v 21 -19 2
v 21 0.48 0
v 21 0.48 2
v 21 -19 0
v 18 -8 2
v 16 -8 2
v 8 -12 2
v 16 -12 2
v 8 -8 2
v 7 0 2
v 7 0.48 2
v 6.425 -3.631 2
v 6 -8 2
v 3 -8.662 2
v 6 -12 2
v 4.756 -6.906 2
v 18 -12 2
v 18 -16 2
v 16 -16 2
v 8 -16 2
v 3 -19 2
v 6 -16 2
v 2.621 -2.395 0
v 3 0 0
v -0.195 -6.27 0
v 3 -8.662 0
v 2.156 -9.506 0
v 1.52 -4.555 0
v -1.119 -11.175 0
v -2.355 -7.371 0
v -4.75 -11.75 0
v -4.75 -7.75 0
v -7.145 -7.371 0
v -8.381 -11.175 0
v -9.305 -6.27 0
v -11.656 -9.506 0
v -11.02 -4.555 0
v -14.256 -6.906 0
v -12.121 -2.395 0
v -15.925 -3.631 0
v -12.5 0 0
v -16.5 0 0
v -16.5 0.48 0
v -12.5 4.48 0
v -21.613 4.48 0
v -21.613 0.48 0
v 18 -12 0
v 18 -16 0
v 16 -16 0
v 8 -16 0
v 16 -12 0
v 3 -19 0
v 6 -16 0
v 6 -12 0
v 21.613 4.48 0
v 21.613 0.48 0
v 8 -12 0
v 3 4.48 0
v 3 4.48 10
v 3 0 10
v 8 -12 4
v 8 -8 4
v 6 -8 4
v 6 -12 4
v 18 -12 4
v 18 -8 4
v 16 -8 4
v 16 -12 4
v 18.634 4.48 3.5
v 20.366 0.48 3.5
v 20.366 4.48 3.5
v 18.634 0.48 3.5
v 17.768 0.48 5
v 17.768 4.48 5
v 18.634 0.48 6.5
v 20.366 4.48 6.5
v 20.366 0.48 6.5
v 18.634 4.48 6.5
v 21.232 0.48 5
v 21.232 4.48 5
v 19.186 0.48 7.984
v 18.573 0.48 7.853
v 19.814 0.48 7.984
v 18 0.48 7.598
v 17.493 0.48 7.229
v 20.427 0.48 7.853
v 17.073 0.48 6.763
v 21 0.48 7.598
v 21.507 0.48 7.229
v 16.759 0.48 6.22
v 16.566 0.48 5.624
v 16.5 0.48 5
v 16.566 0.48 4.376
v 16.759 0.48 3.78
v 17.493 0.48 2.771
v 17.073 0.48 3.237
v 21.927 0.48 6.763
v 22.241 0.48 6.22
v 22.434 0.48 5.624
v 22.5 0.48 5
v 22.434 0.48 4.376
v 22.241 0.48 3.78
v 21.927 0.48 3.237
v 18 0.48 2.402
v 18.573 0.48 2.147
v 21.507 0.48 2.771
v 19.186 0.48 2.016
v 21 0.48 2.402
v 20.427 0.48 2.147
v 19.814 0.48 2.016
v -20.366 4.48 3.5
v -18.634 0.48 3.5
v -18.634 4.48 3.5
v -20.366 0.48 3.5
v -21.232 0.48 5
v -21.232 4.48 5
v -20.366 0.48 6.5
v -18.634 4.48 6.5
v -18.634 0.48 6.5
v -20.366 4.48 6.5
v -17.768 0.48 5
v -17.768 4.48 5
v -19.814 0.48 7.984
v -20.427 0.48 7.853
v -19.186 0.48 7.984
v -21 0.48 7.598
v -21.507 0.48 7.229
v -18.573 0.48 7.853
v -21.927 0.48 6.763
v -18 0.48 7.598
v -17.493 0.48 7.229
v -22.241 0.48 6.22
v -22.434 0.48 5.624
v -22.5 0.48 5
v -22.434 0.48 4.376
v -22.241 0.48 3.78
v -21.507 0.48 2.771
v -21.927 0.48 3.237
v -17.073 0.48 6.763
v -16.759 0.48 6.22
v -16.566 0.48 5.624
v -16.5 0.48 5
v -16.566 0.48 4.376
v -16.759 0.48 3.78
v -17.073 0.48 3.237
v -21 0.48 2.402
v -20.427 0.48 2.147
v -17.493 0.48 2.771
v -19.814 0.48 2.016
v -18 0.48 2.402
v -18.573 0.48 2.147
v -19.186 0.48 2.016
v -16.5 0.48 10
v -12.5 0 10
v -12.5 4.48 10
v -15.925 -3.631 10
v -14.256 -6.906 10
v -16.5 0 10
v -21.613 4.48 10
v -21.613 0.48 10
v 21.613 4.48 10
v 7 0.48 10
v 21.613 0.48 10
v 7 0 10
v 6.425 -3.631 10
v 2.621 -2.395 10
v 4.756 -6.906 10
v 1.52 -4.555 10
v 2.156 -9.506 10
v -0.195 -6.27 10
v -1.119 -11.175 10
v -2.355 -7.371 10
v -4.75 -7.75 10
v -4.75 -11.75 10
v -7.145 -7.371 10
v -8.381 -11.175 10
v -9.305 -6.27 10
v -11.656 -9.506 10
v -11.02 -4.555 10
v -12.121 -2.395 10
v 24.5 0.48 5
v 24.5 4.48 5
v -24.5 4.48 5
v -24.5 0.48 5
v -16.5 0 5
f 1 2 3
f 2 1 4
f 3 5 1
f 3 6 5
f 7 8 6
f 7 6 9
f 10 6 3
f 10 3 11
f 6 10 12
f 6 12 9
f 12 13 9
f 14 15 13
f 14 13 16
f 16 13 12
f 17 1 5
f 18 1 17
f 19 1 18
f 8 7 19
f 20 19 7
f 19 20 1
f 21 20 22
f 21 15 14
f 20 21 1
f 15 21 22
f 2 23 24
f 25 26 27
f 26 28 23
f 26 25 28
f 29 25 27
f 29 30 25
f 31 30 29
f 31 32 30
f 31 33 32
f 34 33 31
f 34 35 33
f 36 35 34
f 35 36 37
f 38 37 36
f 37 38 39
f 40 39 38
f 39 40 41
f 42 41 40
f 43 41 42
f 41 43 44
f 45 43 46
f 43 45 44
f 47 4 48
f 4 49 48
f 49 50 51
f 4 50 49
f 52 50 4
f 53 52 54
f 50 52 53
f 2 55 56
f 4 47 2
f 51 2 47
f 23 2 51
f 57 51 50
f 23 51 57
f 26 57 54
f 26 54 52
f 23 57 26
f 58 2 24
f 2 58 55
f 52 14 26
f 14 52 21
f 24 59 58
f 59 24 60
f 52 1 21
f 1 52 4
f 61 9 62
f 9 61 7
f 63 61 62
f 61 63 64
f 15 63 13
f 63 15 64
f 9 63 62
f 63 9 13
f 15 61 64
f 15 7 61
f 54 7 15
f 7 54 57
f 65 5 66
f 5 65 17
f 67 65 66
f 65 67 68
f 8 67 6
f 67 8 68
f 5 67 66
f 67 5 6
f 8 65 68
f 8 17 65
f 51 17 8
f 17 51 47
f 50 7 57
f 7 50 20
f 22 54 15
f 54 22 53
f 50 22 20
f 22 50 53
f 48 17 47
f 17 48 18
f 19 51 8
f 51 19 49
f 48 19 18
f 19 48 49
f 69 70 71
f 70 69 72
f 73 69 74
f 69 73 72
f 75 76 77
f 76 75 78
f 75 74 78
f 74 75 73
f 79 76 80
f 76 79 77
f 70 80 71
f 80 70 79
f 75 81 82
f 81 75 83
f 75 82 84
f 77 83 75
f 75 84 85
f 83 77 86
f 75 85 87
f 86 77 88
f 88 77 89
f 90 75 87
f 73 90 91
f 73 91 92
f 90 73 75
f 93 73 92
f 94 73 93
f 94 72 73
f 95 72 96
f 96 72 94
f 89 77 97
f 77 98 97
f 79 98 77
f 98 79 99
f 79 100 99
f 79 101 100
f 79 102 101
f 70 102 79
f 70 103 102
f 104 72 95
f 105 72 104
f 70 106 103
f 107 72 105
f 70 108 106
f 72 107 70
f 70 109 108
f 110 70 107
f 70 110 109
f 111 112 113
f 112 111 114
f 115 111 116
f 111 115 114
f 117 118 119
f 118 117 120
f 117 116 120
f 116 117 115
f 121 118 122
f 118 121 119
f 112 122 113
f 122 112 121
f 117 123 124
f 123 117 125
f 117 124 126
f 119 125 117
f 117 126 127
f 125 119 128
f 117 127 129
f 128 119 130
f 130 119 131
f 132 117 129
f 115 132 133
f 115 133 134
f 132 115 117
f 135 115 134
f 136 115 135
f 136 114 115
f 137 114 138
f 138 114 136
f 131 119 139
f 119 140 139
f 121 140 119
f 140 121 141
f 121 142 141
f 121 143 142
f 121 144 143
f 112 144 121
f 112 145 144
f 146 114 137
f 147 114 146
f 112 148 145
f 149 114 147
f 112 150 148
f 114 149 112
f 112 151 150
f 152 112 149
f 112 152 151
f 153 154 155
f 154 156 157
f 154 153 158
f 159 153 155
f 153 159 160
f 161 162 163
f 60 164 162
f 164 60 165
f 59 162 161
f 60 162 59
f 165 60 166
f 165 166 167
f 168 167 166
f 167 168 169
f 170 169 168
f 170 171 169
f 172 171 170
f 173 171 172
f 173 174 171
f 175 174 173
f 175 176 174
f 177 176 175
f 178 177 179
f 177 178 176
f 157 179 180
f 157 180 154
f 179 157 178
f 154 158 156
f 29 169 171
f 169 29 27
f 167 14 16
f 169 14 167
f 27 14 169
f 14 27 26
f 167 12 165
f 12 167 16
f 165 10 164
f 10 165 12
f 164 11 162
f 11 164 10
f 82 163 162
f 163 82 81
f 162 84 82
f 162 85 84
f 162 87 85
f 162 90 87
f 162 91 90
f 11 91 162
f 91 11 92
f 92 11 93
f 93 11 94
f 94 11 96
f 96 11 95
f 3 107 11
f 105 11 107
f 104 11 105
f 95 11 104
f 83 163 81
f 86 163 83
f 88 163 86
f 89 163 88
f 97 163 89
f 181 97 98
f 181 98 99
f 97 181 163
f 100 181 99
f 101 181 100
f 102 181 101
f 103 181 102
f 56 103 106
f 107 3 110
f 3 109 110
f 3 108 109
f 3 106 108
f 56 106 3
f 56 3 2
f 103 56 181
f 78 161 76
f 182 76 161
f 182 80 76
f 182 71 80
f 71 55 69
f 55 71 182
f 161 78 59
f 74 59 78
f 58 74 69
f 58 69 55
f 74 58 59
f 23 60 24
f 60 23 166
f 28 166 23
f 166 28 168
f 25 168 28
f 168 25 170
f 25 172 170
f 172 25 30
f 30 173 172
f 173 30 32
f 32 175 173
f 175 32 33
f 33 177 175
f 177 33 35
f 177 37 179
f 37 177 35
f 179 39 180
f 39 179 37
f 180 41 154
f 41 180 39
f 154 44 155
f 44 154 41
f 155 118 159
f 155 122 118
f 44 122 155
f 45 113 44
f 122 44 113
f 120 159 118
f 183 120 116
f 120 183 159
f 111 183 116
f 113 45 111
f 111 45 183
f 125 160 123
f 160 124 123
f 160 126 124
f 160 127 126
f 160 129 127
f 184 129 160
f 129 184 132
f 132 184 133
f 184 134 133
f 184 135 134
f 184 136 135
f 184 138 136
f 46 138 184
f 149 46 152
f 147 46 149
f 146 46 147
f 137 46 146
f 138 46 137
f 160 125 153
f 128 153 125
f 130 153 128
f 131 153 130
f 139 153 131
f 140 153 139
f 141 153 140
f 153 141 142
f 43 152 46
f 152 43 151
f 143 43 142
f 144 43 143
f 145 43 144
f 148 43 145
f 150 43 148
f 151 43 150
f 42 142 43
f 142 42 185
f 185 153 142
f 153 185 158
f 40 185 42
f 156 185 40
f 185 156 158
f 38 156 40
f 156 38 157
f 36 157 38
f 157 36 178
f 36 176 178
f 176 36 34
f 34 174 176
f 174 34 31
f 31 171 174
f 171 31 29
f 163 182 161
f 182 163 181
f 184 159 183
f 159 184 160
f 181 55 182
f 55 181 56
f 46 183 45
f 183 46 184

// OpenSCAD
include <wallace2.scad>;

y_bearing_retainer2();

module y_bearing_retainer2(){
difference(){
	union(){
  translate([3,-20+1,0]) cube([18,20,2]);
  translate([5+1,-20+8,0]) #cube([2,4,4]);
  translate([10+5+1,-20+8,0]) #cube([2,4,4]);
//  translate([10+5+1,-20+1+3,-1]) #cube([2,4,5]);

}
  translate([5+1,-20+1+3,-1]) #cube([2,4,5]);
  translate([10+5+1,-20+1+3,-1]) #cube([2,4,5]);
}
intersection() {

union(){

	difference() {
		linear_extrude(height = 10, convexity = 5) difference() {
			union() {


				intersection() {
					translate([-yz_motor_distance / 2 + bearing_size / 2, 0, 0]) circle(bearing_size / 2 + 4);
					translate([-yz_motor_distance / 2 + bearing_size / 2 - bearing_size / 2 - 4, -bearing_size, 0]) square([bearing_size + 8, bearing_size]);
				}
				translate([-yz_motor_distance / 2 + bearing_size / 2 - bearing_size / 2 - 4, 0, 0]) square([bearing_size + 8, bearing_size * sqrt(2) / 4 - 1]);
				translate([0, bearing_size * sqrt(2) / 4 - 3, 0]) square([yz_motor_distance + motor_casing - motor_screw_spacing + 10, 4], center = true);
			}
			translate([-yz_motor_distance / 2 + bearing_size / 2, 0, 0]) circle(bearing_size / 2);
			translate([-yz_motor_distance / 2 + bearing_size / 2 - bearing_size / 2, 0, 0]) square(bearing_size);
		}
		//screw holes
		for(side = [1, -1]) translate([side * (yz_motor_distance + motor_casing - motor_screw_spacing) / 2, 0, 5]) rotate(90) rotate([90, 0, 90]) {
			cylinder(r = m3_size * da6, h = bearing_size, center = true, $fn = 6);
			translate([0, 0, bearing_size * sqrt(2) / 4 - 5]) rotate([180, 0, 0]) cylinder(r = m3_size, h = bearing_size, $fn = 30);
		}
	}
}
	translate([0, 0, 5]) rotate(90) rotate([90, 0, 90]) cylinder(r = (yz_motor_distance + motor_casing - motor_screw_spacing + 10) / 2, h = bearing_size + 30, center = true, $fn = 6);
}
}
